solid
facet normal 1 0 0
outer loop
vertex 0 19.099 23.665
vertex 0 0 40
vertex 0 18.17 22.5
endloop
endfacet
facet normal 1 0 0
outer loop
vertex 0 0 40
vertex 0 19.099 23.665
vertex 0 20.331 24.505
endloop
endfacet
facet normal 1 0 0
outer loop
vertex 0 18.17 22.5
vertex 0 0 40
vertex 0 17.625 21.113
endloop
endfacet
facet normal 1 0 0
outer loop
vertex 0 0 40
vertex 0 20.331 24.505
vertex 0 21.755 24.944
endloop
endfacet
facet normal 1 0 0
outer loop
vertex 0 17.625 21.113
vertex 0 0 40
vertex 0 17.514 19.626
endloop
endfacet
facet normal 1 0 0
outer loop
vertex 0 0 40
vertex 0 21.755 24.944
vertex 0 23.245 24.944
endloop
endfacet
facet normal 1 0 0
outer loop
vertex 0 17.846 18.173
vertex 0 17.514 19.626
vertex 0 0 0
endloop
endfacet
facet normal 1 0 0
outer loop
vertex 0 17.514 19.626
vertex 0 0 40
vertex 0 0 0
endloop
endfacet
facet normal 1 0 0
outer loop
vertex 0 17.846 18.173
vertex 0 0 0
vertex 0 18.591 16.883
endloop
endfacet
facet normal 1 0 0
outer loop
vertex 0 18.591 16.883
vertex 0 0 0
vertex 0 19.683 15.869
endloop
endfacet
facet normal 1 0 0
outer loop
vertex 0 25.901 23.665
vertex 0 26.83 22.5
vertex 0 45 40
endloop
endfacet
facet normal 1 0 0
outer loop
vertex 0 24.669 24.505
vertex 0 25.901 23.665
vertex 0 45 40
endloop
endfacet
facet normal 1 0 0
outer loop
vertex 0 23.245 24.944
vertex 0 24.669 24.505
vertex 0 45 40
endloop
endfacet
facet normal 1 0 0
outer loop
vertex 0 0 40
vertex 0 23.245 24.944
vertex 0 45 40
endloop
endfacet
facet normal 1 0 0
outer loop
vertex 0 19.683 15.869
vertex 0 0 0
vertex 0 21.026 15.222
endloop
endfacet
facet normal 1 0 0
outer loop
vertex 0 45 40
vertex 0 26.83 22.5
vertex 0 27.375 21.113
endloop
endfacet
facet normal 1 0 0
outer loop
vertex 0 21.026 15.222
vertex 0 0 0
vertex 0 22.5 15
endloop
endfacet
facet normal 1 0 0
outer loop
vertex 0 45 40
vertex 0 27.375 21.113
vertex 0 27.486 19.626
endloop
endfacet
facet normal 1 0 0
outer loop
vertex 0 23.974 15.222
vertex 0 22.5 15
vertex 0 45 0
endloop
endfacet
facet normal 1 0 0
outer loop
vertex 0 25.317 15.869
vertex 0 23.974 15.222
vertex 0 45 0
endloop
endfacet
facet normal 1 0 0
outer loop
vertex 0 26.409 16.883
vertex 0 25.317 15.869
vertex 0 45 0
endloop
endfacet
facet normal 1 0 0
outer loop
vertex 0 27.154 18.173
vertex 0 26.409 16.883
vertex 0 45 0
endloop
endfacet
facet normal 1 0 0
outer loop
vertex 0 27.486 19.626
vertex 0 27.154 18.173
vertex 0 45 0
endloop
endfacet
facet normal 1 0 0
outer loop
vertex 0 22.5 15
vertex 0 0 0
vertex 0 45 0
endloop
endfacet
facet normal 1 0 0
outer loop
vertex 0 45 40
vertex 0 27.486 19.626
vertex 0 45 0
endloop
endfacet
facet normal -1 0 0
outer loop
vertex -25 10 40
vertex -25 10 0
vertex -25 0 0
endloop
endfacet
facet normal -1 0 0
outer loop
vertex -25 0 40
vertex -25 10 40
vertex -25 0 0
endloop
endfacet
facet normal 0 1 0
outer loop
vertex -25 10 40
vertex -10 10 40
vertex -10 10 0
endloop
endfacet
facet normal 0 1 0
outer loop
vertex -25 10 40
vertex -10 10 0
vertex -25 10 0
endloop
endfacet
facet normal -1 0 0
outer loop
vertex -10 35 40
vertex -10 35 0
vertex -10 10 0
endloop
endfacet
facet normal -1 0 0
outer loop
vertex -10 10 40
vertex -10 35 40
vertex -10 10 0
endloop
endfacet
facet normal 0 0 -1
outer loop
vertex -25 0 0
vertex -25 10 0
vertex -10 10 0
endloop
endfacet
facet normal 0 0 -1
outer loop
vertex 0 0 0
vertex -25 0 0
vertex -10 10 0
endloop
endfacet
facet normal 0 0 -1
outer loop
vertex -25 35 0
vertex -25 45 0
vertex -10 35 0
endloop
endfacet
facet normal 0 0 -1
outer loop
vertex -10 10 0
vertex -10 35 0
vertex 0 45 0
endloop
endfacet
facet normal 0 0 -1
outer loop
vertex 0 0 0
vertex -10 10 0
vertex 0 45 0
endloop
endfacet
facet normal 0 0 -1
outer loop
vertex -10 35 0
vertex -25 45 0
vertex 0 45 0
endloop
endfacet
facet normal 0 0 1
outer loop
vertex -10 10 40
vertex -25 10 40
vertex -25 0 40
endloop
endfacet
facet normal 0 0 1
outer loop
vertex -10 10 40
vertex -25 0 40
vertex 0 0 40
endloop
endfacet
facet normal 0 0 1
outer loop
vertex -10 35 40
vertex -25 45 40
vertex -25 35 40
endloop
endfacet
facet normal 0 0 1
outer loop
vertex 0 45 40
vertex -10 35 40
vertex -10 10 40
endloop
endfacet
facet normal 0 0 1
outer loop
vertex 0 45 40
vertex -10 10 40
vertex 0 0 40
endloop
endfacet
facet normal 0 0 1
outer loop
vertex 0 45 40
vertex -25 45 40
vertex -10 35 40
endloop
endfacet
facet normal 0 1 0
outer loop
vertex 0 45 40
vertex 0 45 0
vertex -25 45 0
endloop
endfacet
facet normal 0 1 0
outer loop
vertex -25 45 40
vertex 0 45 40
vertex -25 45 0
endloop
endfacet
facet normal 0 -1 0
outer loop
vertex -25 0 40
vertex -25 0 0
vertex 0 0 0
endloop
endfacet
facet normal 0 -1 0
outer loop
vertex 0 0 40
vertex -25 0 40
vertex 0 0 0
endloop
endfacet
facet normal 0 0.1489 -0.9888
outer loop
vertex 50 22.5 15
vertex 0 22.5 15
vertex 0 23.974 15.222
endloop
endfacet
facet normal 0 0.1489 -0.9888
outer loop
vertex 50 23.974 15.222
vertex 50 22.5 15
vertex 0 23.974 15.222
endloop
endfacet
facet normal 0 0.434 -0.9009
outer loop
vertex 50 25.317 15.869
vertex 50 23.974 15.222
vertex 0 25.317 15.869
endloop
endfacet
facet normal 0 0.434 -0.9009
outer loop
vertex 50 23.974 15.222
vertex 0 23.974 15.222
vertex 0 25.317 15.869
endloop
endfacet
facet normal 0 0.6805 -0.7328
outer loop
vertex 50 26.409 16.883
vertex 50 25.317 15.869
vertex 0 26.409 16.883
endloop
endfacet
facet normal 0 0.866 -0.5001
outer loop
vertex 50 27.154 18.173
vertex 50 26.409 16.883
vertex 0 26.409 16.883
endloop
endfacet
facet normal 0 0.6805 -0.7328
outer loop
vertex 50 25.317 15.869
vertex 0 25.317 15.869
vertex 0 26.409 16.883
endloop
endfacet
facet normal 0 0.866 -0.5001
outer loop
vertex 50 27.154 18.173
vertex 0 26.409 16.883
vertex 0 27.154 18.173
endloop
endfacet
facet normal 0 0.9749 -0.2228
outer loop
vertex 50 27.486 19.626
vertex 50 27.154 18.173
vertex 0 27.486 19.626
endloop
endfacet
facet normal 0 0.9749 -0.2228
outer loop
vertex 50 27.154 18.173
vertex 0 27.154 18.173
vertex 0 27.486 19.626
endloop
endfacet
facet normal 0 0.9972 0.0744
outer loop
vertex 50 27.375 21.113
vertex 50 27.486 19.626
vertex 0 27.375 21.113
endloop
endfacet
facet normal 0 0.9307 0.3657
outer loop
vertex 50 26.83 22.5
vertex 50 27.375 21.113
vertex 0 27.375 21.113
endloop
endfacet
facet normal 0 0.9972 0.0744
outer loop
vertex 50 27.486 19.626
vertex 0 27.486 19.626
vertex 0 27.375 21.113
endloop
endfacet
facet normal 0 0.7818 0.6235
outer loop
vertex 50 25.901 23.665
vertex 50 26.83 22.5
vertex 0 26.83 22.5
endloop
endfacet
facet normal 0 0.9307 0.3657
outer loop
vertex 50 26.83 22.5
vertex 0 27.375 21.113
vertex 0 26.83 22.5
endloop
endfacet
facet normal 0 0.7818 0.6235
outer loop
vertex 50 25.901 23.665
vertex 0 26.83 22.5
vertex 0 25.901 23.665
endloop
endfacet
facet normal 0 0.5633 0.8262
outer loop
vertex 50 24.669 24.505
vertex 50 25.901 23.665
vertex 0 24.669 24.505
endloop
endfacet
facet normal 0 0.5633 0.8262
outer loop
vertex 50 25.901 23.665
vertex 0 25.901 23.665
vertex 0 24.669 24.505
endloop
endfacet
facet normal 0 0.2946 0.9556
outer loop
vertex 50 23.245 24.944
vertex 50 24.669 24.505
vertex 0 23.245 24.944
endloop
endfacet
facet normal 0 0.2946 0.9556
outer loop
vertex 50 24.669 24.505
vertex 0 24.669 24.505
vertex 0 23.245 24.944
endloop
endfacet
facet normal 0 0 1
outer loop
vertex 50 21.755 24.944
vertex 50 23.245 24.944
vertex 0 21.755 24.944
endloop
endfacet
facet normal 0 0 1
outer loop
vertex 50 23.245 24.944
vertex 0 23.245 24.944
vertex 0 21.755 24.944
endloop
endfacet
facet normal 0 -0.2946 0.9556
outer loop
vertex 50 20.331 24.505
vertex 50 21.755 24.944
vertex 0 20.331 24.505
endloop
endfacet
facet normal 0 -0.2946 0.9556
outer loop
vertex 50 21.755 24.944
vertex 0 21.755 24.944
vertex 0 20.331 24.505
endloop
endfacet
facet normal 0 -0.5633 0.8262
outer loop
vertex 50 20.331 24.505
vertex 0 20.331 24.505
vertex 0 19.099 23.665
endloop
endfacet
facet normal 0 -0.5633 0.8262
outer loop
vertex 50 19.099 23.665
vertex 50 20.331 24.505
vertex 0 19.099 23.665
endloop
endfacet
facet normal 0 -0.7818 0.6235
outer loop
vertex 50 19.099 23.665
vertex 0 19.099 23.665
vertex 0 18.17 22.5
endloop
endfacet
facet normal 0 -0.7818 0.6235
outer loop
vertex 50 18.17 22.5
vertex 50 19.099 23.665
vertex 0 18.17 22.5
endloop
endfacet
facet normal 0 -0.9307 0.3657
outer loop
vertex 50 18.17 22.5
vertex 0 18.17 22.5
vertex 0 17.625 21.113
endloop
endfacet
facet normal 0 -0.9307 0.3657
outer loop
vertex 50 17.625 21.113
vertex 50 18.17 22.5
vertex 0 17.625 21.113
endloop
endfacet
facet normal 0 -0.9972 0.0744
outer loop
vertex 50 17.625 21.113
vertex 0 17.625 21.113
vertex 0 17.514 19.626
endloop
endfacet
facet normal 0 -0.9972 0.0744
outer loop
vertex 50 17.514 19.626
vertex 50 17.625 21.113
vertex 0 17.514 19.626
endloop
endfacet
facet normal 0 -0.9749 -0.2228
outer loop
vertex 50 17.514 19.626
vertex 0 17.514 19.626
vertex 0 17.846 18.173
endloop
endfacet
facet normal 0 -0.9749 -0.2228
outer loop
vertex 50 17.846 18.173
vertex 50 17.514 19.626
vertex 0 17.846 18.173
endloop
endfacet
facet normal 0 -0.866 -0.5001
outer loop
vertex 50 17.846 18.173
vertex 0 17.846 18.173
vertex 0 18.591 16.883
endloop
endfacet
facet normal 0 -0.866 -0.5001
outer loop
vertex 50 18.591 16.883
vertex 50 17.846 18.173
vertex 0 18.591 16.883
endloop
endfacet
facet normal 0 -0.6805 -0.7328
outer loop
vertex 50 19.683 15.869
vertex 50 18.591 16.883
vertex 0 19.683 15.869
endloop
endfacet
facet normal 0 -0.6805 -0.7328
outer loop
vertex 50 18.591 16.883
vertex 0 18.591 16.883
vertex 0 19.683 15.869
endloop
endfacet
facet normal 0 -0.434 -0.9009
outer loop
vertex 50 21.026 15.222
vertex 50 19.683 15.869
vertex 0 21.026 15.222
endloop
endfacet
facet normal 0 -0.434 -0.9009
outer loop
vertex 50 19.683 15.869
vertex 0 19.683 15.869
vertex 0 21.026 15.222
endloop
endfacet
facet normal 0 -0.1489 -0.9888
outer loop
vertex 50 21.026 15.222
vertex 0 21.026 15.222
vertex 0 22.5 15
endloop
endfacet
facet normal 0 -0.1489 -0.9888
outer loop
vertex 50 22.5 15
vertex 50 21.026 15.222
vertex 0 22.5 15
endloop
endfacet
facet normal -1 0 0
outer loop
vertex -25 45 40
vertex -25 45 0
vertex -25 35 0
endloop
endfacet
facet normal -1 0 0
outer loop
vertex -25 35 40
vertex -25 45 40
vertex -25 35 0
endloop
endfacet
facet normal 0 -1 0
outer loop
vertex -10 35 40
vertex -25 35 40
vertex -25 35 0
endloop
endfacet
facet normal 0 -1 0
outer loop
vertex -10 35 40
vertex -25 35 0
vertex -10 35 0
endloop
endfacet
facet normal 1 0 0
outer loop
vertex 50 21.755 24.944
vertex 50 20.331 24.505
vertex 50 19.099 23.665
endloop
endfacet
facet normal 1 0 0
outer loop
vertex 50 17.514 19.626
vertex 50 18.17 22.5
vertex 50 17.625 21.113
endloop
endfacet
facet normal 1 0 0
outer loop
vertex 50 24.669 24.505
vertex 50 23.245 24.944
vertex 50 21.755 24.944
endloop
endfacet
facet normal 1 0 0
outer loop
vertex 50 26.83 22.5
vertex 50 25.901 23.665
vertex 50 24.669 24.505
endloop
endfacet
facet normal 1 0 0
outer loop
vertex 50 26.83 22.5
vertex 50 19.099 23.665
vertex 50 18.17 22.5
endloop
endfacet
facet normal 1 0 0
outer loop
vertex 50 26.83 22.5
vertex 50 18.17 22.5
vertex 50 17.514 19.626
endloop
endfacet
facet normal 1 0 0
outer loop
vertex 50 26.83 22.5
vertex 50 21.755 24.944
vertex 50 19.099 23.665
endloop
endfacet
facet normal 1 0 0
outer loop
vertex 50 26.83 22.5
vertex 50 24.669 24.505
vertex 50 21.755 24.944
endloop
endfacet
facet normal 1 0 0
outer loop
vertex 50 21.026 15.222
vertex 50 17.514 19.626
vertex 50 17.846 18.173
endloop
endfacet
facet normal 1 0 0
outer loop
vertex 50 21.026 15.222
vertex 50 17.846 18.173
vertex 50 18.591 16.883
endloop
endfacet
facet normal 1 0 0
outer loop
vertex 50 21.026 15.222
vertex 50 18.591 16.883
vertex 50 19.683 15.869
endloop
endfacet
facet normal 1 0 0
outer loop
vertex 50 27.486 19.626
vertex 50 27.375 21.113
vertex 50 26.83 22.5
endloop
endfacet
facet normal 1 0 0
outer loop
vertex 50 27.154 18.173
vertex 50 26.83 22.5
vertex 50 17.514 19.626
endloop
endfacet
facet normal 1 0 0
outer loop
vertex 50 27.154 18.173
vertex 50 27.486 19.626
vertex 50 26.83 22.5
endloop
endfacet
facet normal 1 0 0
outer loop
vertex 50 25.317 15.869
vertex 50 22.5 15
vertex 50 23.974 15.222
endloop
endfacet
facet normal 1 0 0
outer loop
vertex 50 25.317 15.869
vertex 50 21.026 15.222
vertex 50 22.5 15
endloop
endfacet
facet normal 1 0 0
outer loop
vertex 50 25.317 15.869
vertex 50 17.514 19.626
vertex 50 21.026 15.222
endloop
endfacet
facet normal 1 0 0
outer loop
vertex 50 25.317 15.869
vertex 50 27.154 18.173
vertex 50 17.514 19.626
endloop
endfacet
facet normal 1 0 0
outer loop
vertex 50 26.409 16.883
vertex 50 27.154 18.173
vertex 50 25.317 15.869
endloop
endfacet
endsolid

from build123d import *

# Parameters (mm, degrees)
BOSS_EXTRUDE1_DEPTH = 40
SKETCH2_R           = 5
BOSS_EXTRUDE2_DEPTH = 50


with BuildPart() as part:
    # Sketch1 → Boss-Extrude1 (new body)
    with BuildSketch(Plane.XY):
        Polygon((0, 10), (0, 35), (0, 45), (-25, 45), (-25, 35), (-10, 35), (-10, 10), (-25, 10), (-25, 0), (0, 0), align=None)
    extrude(amount=BOSS_EXTRUDE1_DEPTH)

    # Sketch2 → Boss-Extrude2 (add)
    with BuildSketch(Plane(origin=(0, 0, 0), x_dir=(0, 0, -1), z_dir=(1, 0, 0))):
        with Locations((-20, 22.5)):
            Circle(SKETCH2_R)
    extrude(amount=BOSS_EXTRUDE2_DEPTH)


solid = part.part
